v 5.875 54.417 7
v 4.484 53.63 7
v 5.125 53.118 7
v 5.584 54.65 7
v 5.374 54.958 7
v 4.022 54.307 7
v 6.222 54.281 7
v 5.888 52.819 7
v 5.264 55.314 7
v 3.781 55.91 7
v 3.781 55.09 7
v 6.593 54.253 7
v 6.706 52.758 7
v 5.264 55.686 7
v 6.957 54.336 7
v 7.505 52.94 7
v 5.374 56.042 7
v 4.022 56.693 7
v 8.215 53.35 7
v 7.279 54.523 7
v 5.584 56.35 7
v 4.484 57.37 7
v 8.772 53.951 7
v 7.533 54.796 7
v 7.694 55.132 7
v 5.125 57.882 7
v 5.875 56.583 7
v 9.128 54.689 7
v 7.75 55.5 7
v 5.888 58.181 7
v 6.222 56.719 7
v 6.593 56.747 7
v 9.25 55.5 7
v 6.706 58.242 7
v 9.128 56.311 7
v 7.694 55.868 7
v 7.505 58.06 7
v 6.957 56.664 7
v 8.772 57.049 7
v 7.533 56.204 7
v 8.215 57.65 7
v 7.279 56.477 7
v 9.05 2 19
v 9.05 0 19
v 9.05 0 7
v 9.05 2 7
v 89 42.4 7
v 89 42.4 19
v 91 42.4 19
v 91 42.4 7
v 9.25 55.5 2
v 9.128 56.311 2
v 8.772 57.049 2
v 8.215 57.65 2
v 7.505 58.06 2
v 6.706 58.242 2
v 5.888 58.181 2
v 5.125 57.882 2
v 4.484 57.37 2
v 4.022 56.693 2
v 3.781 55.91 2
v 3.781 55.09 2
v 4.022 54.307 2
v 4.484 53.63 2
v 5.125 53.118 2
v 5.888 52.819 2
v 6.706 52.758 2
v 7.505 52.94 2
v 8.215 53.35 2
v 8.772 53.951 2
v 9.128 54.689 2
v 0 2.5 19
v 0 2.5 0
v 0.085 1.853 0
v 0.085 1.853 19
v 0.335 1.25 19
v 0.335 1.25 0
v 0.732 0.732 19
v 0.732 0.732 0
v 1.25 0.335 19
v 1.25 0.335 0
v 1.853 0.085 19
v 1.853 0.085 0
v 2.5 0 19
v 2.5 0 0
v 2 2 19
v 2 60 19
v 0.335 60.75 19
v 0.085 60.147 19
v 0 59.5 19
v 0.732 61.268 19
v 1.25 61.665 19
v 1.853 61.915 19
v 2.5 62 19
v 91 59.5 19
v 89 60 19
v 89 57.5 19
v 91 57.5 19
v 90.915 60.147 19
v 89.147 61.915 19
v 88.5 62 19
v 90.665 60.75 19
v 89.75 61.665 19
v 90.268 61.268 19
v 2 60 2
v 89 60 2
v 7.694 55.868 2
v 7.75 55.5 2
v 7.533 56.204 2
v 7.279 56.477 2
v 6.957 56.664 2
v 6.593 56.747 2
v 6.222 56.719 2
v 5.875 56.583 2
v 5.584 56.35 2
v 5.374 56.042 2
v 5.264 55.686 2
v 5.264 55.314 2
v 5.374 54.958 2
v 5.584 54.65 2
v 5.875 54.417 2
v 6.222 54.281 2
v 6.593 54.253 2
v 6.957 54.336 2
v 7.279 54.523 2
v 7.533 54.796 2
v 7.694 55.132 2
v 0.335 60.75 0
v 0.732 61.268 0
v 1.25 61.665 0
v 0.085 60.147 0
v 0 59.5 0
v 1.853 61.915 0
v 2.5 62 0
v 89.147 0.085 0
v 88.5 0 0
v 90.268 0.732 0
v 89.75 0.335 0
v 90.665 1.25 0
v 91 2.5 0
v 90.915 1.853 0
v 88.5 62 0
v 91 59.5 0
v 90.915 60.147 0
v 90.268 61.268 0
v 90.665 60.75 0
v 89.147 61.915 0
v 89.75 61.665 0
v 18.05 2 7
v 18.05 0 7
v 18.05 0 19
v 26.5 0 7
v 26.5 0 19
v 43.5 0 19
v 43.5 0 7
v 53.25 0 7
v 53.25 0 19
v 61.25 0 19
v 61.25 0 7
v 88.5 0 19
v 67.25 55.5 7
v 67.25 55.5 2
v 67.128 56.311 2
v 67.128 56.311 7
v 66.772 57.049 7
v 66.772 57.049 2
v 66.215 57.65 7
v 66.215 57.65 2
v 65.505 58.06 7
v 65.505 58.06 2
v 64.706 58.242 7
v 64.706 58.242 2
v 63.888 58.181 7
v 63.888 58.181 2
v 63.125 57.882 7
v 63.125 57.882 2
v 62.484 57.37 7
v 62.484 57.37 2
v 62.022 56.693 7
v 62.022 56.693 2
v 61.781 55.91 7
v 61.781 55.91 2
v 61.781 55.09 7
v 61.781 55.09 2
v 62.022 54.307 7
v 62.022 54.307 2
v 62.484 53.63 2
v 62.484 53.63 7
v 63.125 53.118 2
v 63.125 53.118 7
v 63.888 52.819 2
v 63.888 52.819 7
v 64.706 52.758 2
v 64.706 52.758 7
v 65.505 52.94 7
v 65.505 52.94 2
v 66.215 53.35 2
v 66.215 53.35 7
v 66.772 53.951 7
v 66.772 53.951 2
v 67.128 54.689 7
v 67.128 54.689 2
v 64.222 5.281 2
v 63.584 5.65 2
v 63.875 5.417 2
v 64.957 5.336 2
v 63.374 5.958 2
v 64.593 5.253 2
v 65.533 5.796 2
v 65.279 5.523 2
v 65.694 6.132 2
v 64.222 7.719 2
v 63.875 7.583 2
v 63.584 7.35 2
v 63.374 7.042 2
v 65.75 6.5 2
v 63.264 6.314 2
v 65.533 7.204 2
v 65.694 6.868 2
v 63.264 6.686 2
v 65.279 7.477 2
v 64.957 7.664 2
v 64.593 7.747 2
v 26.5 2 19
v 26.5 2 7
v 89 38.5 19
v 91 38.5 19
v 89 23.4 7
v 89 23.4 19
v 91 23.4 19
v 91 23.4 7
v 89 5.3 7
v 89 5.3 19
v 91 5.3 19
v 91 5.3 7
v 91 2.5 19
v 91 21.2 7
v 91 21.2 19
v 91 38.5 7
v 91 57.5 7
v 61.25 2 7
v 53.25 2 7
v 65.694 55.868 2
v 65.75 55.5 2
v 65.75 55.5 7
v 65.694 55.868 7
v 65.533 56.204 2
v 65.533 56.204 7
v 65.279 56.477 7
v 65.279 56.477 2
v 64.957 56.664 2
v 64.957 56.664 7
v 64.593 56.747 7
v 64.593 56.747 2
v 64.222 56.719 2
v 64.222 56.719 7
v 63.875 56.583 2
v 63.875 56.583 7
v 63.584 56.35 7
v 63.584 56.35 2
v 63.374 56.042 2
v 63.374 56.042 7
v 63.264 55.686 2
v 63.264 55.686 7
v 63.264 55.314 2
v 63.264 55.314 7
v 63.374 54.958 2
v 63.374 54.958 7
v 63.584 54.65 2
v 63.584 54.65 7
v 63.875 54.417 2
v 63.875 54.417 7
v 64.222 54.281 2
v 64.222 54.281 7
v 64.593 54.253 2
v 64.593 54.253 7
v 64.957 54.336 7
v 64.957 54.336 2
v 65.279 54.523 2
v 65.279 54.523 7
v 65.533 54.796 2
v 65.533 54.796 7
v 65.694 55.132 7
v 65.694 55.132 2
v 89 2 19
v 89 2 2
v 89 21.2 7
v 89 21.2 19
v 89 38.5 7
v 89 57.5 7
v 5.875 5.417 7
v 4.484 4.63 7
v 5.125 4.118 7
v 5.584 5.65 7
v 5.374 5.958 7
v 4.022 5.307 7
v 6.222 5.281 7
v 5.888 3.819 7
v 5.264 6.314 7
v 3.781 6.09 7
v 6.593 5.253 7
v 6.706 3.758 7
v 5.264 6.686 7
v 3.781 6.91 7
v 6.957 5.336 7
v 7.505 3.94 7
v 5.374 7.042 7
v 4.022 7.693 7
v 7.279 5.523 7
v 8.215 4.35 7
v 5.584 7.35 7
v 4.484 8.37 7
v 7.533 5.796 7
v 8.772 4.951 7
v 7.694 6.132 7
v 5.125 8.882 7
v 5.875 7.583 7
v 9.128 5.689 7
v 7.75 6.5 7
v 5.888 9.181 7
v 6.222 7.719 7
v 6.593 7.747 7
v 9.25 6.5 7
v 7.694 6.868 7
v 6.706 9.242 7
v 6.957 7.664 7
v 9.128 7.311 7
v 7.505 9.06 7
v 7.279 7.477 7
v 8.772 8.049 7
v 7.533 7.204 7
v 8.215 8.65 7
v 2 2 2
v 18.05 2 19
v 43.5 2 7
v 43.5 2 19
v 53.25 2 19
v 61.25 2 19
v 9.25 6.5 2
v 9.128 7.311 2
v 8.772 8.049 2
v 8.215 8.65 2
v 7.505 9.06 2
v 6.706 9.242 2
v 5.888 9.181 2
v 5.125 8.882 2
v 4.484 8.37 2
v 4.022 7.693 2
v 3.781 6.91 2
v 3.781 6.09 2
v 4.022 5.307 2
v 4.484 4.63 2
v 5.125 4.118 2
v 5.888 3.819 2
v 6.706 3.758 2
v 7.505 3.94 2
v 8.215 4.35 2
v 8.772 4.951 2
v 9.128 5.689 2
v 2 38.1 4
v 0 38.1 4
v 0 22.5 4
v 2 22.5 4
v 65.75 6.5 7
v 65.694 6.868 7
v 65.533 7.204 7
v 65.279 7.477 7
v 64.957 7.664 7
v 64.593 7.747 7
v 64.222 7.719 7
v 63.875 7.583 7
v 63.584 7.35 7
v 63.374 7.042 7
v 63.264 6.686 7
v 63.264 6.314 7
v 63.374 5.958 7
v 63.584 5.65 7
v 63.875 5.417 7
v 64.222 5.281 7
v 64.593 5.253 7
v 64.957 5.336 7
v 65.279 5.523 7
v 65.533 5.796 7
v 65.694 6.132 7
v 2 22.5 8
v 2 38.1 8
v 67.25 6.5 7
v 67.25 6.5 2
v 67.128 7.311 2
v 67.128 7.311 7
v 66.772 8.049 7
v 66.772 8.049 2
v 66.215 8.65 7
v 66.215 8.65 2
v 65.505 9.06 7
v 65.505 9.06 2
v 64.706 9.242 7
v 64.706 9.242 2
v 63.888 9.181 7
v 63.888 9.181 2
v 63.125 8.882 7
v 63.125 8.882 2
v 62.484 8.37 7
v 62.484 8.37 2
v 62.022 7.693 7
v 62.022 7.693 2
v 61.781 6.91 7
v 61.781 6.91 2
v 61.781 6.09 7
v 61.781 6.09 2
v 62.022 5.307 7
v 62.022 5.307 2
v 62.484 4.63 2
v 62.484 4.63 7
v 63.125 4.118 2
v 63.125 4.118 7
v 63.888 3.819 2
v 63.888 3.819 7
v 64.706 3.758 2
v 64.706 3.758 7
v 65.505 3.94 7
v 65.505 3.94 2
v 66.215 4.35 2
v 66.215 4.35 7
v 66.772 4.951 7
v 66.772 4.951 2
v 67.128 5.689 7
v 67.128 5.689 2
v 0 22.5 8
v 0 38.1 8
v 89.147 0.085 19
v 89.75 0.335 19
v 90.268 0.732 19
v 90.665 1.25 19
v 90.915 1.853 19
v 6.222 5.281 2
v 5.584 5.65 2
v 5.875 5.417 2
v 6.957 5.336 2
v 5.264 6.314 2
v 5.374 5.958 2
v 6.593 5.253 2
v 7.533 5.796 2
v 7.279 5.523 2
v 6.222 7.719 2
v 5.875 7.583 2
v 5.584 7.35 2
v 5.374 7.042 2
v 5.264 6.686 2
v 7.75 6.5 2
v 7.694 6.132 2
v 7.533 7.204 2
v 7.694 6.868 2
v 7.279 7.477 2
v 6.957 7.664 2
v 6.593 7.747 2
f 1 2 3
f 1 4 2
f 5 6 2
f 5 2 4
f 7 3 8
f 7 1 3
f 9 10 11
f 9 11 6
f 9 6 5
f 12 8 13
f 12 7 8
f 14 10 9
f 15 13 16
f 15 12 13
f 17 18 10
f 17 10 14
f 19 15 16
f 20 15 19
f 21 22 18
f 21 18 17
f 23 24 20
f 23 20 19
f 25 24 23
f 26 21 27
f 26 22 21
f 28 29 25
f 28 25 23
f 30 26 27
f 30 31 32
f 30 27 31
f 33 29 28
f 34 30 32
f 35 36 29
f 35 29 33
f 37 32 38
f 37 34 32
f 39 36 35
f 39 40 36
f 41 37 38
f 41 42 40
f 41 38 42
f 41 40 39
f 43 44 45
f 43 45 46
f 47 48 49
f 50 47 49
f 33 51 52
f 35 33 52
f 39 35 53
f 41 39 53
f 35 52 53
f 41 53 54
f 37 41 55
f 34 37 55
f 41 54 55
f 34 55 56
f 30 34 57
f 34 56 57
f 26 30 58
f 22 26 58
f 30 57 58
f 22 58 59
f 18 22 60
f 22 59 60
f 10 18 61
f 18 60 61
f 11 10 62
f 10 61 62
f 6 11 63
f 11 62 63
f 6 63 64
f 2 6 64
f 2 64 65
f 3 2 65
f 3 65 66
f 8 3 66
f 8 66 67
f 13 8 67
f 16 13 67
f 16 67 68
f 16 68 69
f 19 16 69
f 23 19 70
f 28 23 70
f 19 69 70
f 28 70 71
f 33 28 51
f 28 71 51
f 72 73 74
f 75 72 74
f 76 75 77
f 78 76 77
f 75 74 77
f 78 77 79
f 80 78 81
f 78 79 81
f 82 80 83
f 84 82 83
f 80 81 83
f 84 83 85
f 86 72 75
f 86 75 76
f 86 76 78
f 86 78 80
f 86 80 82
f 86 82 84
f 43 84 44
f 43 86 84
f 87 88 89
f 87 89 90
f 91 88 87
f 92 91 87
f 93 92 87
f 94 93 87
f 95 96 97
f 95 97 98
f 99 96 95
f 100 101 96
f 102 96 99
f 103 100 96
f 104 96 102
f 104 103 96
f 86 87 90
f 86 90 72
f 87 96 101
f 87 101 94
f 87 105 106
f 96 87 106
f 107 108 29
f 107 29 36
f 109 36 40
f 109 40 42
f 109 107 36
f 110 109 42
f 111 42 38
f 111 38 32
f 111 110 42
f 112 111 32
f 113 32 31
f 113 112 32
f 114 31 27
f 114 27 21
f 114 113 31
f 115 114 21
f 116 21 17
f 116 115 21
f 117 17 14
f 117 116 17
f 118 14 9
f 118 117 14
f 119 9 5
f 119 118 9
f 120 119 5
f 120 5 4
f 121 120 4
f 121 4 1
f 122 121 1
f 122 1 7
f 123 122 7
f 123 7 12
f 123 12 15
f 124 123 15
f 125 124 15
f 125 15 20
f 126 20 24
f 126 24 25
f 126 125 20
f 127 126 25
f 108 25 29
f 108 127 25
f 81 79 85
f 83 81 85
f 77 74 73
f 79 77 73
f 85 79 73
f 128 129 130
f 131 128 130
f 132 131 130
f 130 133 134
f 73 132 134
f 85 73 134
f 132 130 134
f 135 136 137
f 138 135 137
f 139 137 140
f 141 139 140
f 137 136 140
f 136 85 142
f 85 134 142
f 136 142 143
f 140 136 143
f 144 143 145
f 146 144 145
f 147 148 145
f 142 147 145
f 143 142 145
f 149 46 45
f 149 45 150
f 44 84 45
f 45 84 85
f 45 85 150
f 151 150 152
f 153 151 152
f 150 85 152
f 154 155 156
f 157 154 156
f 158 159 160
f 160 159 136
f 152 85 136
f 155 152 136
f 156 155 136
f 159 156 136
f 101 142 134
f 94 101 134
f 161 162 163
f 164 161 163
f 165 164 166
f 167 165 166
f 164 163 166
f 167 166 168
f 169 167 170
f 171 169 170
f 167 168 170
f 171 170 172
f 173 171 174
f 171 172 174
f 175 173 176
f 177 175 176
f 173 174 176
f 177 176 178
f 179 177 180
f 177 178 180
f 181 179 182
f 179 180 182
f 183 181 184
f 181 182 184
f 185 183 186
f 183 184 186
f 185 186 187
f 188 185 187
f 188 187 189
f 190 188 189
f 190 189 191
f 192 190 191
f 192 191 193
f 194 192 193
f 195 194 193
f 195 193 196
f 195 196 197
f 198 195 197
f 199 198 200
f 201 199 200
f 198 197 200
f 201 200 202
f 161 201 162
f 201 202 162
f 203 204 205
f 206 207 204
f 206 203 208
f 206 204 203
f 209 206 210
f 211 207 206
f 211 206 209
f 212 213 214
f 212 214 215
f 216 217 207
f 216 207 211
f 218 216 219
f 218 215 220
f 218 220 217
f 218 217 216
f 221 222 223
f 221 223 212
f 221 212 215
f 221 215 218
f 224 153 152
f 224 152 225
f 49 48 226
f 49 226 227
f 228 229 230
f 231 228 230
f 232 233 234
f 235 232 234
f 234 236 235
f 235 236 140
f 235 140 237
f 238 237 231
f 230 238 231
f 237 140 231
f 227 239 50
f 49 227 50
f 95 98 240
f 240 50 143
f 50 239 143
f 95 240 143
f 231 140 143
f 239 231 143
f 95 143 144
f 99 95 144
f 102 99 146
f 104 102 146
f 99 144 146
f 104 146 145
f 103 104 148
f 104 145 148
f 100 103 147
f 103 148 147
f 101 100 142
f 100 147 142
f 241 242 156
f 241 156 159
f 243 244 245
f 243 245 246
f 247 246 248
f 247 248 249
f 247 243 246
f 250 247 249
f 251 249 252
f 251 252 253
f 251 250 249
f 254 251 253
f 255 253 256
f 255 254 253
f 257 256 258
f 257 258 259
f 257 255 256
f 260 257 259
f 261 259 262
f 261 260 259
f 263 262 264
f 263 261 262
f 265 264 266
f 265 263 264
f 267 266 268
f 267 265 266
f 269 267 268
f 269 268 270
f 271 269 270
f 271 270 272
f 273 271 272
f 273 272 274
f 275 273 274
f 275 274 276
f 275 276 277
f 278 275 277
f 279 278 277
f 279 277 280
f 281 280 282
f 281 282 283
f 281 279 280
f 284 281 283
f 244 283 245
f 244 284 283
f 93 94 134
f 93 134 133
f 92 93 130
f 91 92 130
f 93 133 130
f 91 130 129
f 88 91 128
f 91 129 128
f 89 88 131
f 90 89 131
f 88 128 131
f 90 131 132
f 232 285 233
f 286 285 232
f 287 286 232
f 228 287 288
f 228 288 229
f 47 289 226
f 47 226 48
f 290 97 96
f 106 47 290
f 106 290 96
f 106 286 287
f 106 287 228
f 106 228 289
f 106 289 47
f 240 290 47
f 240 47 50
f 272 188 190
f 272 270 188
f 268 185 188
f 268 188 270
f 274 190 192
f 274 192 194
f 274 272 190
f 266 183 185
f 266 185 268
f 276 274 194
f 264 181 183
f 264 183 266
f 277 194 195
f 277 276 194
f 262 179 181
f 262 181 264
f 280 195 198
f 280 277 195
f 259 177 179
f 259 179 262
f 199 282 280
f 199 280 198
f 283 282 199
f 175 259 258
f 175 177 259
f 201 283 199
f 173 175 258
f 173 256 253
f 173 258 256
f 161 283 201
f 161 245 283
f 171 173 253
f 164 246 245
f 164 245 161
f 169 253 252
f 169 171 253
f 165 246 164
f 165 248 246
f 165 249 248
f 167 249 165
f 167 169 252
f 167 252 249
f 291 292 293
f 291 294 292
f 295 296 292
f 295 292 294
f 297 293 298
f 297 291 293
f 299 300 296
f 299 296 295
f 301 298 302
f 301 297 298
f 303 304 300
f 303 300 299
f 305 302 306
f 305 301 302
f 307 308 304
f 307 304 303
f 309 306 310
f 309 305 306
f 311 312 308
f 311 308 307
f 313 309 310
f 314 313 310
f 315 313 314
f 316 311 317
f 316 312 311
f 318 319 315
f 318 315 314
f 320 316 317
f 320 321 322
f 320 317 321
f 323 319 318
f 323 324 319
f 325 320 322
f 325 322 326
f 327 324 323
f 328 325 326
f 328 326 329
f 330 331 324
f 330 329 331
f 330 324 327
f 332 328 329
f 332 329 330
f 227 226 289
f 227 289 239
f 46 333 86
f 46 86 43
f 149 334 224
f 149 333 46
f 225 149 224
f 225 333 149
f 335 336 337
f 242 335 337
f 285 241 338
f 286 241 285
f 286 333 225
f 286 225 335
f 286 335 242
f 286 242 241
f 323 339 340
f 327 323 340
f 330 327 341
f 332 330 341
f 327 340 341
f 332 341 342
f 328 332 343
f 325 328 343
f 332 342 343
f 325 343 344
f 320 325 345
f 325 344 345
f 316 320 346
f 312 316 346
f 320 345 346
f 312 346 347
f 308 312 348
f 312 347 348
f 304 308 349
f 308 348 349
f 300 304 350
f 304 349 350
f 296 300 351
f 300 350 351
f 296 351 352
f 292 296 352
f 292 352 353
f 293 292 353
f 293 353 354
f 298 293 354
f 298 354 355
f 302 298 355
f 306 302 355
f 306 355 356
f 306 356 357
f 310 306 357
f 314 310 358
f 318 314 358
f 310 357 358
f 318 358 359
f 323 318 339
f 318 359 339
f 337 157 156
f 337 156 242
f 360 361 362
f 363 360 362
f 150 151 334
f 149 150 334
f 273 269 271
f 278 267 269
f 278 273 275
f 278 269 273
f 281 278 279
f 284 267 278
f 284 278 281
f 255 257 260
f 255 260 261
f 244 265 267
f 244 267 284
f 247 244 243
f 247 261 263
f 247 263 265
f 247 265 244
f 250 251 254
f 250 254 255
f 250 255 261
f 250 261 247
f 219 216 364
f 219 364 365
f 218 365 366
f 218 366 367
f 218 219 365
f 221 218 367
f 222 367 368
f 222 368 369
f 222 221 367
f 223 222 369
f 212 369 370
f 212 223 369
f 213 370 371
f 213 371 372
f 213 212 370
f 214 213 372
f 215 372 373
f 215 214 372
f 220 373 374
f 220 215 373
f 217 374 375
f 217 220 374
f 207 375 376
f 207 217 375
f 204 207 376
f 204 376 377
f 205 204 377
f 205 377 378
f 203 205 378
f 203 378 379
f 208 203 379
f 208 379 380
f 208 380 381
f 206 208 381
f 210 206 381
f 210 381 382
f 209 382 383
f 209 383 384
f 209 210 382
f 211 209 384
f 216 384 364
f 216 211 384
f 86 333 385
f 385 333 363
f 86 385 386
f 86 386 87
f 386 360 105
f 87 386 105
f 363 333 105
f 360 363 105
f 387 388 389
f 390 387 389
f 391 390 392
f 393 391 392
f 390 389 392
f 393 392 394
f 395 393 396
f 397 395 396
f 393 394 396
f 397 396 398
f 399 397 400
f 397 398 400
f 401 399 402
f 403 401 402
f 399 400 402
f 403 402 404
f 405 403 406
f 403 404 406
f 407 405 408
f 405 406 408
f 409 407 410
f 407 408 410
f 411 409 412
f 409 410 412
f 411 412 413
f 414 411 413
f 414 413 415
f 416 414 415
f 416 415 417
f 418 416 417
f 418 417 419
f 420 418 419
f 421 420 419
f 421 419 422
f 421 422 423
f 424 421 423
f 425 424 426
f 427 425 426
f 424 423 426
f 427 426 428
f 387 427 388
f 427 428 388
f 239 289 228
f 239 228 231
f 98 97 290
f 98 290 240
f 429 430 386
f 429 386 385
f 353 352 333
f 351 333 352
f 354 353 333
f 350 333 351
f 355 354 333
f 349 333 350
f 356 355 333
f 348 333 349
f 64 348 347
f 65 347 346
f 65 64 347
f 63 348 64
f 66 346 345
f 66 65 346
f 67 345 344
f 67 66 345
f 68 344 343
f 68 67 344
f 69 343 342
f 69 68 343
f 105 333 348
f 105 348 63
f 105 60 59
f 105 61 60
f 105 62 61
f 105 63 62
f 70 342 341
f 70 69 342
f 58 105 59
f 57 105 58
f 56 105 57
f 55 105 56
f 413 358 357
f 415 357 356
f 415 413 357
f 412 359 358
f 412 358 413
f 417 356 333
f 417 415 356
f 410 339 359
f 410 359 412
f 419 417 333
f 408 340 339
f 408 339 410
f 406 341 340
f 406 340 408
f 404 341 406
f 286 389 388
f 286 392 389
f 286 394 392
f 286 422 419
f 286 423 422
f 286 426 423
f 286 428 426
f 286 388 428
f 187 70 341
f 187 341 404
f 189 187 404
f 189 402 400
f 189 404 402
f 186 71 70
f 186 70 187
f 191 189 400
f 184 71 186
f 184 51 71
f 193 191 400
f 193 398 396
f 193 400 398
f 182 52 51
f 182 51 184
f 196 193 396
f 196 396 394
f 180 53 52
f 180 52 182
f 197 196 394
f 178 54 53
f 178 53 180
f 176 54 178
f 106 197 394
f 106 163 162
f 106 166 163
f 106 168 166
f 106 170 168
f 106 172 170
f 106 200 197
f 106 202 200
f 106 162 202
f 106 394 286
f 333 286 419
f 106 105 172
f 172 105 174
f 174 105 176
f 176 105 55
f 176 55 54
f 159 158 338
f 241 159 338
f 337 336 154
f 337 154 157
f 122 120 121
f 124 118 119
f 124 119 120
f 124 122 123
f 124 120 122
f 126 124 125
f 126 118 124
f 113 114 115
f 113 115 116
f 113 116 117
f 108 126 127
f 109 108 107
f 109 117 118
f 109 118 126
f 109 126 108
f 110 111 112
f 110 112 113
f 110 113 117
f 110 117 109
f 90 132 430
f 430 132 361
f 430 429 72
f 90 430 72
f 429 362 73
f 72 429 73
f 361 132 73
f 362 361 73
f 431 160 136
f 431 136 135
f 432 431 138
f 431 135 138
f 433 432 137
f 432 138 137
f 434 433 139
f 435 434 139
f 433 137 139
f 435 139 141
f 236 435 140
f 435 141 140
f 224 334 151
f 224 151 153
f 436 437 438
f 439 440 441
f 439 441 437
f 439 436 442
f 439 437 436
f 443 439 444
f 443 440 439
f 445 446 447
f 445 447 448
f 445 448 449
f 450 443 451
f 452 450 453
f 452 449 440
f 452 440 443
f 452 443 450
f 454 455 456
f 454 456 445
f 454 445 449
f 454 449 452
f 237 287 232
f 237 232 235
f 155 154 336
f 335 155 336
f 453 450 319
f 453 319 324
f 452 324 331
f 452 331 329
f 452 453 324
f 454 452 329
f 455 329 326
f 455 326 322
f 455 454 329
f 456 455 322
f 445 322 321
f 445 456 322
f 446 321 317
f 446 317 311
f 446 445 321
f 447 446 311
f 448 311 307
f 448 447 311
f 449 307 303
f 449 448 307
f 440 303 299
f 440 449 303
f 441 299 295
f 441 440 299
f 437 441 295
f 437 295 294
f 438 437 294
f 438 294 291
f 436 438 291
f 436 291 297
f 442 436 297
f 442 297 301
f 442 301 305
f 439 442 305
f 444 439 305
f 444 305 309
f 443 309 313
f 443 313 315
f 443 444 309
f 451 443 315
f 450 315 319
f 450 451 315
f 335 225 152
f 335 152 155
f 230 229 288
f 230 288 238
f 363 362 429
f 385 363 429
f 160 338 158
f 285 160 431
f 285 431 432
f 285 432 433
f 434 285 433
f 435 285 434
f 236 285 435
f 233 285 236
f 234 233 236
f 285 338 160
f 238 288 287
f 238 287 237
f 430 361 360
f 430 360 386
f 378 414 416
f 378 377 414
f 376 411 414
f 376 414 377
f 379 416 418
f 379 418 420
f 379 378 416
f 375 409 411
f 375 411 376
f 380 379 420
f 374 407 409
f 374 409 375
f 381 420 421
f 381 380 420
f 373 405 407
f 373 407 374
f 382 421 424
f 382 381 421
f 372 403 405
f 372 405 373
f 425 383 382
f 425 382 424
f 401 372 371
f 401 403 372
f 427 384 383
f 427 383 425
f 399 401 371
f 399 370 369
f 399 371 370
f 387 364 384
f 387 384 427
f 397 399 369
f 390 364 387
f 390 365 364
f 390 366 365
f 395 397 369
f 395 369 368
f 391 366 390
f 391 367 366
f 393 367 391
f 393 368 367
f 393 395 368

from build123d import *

# Parameters (mm, degrees)
F0_W     = 87
F0_H     = 58
F1_DEPTH = 2
F2_DEPTH = 19
F3_R     = 2.75
F3_R_2   = 1.25
F4_DEPTH = 5
F5_W     = 9
F5_H     = 2
F5_W_2   = 8
F5_W_3   = 17
F5_W_4   = 2
F5_H_2   = 15.9
F5_H_3   = 15.1
F6_DEPTH = 12
F7_W     = 15.6
F7_H     = 4
F8_DEPTH = 2


with BuildPart() as f1:
    # F0 (on Top) → F1 (new body)
    with BuildSketch(Plane.XY):
        with BuildLine():
            ThreePointArc((0, 2.5), (0.732233047, 0.732233047), (2.5, 0))
            Line((2.5, 0), (88.5, 0))
            ThreePointArc((88.5, 0), (90.267766953, 0.732233047), (91, 2.5))
            Line((91, 2.5), (91, 59.5))
            ThreePointArc((91, 59.5), (90.267766953, 61.267766953), (88.5, 62))
            Line((88.5, 62), (2.5, 62))
            ThreePointArc((2.5, 62), (0.732233047, 61.267766953), (0, 59.5))
            Line((0, 59.5), (0, 2.5))
        make_face()
        with Locations((45.5, 31)):
            Rectangle(F0_W, F0_H, mode=Mode.SUBTRACT)
        with Locations((45.5, 31)):
            Rectangle(F0_W, F0_H)
    extrude(amount=F1_DEPTH)

    # F0 (on Top) → F2 (join)
    with BuildSketch(Plane.XY):
        with BuildLine():
            ThreePointArc((0, 2.5), (0.732233047, 0.732233047), (2.5, 0))
            Line((2.5, 0), (88.5, 0))
            ThreePointArc((88.5, 0), (90.267766953, 0.732233047), (91, 2.5))
            Line((91, 2.5), (91, 59.5))
            ThreePointArc((91, 59.5), (90.267766953, 61.267766953), (88.5, 62))
            Line((88.5, 62), (2.5, 62))
            ThreePointArc((2.5, 62), (0.732233047, 61.267766953), (0, 59.5))
            Line((0, 59.5), (0, 2.5))
        make_face()
        with Locations((45.5, 31)):
            Rectangle(F0_W, F0_H, mode=Mode.SUBTRACT)
    extrude(amount=F2_DEPTH)

    # F3 (on face) → F4 (join)
    with BuildSketch(Plane.XY.offset(2)):
        with Locations((6.5, 55.5)):
            Circle(F3_R)
        with Locations((6.5, 55.5)):
            Circle(F3_R_2, mode=Mode.SUBTRACT)
        with Locations((64.5, 55.5)):
            Circle(F3_R)
        with Locations((64.5, 55.5)):
            Circle(F3_R_2, mode=Mode.SUBTRACT)
        with Locations((6.5, 6.5)):
            Circle(F3_R)
        with Locations((6.5, 6.5)):
            Circle(F3_R_2, mode=Mode.SUBTRACT)
        with Locations((64.5, 6.5)):
            Circle(F3_R)
        with Locations((64.5, 6.5)):
            Circle(F3_R_2, mode=Mode.SUBTRACT)
    extrude(amount=F4_DEPTH)

    # F5 (on face) → F6 (cut)
    with BuildSketch(Plane.XY.offset(19)):
        with Locations((13.55, 1)):
            Rectangle(F5_W, F5_H)
        with Locations((57.25, 1)):
            Rectangle(F5_W_2, F5_H)
        with Locations((35, 1)):
            Rectangle(F5_W_3, F5_H)
        with Locations((90, 13.25)):
            Rectangle(F5_W_4, F5_H_2)
        with Locations((90, 30.95)):
            Rectangle(F5_W_4, F5_H_3)
        with Locations((90, 49.95)):
            Rectangle(F5_W_4, F5_H_3)
    extrude(amount=-F6_DEPTH, mode=Mode.SUBTRACT)

    # F7 (on face) → F8 (cut, through all)
    with BuildSketch(Plane(origin=(0, 0, 0), x_dir=(0, -1, 0), z_dir=(-1, 0, 0))):
        with Locations((-30.3, 6)):
            Rectangle(F7_W, F7_H)
    extrude(amount=-F8_DEPTH, mode=Mode.SUBTRACT)


solid = f1.part
